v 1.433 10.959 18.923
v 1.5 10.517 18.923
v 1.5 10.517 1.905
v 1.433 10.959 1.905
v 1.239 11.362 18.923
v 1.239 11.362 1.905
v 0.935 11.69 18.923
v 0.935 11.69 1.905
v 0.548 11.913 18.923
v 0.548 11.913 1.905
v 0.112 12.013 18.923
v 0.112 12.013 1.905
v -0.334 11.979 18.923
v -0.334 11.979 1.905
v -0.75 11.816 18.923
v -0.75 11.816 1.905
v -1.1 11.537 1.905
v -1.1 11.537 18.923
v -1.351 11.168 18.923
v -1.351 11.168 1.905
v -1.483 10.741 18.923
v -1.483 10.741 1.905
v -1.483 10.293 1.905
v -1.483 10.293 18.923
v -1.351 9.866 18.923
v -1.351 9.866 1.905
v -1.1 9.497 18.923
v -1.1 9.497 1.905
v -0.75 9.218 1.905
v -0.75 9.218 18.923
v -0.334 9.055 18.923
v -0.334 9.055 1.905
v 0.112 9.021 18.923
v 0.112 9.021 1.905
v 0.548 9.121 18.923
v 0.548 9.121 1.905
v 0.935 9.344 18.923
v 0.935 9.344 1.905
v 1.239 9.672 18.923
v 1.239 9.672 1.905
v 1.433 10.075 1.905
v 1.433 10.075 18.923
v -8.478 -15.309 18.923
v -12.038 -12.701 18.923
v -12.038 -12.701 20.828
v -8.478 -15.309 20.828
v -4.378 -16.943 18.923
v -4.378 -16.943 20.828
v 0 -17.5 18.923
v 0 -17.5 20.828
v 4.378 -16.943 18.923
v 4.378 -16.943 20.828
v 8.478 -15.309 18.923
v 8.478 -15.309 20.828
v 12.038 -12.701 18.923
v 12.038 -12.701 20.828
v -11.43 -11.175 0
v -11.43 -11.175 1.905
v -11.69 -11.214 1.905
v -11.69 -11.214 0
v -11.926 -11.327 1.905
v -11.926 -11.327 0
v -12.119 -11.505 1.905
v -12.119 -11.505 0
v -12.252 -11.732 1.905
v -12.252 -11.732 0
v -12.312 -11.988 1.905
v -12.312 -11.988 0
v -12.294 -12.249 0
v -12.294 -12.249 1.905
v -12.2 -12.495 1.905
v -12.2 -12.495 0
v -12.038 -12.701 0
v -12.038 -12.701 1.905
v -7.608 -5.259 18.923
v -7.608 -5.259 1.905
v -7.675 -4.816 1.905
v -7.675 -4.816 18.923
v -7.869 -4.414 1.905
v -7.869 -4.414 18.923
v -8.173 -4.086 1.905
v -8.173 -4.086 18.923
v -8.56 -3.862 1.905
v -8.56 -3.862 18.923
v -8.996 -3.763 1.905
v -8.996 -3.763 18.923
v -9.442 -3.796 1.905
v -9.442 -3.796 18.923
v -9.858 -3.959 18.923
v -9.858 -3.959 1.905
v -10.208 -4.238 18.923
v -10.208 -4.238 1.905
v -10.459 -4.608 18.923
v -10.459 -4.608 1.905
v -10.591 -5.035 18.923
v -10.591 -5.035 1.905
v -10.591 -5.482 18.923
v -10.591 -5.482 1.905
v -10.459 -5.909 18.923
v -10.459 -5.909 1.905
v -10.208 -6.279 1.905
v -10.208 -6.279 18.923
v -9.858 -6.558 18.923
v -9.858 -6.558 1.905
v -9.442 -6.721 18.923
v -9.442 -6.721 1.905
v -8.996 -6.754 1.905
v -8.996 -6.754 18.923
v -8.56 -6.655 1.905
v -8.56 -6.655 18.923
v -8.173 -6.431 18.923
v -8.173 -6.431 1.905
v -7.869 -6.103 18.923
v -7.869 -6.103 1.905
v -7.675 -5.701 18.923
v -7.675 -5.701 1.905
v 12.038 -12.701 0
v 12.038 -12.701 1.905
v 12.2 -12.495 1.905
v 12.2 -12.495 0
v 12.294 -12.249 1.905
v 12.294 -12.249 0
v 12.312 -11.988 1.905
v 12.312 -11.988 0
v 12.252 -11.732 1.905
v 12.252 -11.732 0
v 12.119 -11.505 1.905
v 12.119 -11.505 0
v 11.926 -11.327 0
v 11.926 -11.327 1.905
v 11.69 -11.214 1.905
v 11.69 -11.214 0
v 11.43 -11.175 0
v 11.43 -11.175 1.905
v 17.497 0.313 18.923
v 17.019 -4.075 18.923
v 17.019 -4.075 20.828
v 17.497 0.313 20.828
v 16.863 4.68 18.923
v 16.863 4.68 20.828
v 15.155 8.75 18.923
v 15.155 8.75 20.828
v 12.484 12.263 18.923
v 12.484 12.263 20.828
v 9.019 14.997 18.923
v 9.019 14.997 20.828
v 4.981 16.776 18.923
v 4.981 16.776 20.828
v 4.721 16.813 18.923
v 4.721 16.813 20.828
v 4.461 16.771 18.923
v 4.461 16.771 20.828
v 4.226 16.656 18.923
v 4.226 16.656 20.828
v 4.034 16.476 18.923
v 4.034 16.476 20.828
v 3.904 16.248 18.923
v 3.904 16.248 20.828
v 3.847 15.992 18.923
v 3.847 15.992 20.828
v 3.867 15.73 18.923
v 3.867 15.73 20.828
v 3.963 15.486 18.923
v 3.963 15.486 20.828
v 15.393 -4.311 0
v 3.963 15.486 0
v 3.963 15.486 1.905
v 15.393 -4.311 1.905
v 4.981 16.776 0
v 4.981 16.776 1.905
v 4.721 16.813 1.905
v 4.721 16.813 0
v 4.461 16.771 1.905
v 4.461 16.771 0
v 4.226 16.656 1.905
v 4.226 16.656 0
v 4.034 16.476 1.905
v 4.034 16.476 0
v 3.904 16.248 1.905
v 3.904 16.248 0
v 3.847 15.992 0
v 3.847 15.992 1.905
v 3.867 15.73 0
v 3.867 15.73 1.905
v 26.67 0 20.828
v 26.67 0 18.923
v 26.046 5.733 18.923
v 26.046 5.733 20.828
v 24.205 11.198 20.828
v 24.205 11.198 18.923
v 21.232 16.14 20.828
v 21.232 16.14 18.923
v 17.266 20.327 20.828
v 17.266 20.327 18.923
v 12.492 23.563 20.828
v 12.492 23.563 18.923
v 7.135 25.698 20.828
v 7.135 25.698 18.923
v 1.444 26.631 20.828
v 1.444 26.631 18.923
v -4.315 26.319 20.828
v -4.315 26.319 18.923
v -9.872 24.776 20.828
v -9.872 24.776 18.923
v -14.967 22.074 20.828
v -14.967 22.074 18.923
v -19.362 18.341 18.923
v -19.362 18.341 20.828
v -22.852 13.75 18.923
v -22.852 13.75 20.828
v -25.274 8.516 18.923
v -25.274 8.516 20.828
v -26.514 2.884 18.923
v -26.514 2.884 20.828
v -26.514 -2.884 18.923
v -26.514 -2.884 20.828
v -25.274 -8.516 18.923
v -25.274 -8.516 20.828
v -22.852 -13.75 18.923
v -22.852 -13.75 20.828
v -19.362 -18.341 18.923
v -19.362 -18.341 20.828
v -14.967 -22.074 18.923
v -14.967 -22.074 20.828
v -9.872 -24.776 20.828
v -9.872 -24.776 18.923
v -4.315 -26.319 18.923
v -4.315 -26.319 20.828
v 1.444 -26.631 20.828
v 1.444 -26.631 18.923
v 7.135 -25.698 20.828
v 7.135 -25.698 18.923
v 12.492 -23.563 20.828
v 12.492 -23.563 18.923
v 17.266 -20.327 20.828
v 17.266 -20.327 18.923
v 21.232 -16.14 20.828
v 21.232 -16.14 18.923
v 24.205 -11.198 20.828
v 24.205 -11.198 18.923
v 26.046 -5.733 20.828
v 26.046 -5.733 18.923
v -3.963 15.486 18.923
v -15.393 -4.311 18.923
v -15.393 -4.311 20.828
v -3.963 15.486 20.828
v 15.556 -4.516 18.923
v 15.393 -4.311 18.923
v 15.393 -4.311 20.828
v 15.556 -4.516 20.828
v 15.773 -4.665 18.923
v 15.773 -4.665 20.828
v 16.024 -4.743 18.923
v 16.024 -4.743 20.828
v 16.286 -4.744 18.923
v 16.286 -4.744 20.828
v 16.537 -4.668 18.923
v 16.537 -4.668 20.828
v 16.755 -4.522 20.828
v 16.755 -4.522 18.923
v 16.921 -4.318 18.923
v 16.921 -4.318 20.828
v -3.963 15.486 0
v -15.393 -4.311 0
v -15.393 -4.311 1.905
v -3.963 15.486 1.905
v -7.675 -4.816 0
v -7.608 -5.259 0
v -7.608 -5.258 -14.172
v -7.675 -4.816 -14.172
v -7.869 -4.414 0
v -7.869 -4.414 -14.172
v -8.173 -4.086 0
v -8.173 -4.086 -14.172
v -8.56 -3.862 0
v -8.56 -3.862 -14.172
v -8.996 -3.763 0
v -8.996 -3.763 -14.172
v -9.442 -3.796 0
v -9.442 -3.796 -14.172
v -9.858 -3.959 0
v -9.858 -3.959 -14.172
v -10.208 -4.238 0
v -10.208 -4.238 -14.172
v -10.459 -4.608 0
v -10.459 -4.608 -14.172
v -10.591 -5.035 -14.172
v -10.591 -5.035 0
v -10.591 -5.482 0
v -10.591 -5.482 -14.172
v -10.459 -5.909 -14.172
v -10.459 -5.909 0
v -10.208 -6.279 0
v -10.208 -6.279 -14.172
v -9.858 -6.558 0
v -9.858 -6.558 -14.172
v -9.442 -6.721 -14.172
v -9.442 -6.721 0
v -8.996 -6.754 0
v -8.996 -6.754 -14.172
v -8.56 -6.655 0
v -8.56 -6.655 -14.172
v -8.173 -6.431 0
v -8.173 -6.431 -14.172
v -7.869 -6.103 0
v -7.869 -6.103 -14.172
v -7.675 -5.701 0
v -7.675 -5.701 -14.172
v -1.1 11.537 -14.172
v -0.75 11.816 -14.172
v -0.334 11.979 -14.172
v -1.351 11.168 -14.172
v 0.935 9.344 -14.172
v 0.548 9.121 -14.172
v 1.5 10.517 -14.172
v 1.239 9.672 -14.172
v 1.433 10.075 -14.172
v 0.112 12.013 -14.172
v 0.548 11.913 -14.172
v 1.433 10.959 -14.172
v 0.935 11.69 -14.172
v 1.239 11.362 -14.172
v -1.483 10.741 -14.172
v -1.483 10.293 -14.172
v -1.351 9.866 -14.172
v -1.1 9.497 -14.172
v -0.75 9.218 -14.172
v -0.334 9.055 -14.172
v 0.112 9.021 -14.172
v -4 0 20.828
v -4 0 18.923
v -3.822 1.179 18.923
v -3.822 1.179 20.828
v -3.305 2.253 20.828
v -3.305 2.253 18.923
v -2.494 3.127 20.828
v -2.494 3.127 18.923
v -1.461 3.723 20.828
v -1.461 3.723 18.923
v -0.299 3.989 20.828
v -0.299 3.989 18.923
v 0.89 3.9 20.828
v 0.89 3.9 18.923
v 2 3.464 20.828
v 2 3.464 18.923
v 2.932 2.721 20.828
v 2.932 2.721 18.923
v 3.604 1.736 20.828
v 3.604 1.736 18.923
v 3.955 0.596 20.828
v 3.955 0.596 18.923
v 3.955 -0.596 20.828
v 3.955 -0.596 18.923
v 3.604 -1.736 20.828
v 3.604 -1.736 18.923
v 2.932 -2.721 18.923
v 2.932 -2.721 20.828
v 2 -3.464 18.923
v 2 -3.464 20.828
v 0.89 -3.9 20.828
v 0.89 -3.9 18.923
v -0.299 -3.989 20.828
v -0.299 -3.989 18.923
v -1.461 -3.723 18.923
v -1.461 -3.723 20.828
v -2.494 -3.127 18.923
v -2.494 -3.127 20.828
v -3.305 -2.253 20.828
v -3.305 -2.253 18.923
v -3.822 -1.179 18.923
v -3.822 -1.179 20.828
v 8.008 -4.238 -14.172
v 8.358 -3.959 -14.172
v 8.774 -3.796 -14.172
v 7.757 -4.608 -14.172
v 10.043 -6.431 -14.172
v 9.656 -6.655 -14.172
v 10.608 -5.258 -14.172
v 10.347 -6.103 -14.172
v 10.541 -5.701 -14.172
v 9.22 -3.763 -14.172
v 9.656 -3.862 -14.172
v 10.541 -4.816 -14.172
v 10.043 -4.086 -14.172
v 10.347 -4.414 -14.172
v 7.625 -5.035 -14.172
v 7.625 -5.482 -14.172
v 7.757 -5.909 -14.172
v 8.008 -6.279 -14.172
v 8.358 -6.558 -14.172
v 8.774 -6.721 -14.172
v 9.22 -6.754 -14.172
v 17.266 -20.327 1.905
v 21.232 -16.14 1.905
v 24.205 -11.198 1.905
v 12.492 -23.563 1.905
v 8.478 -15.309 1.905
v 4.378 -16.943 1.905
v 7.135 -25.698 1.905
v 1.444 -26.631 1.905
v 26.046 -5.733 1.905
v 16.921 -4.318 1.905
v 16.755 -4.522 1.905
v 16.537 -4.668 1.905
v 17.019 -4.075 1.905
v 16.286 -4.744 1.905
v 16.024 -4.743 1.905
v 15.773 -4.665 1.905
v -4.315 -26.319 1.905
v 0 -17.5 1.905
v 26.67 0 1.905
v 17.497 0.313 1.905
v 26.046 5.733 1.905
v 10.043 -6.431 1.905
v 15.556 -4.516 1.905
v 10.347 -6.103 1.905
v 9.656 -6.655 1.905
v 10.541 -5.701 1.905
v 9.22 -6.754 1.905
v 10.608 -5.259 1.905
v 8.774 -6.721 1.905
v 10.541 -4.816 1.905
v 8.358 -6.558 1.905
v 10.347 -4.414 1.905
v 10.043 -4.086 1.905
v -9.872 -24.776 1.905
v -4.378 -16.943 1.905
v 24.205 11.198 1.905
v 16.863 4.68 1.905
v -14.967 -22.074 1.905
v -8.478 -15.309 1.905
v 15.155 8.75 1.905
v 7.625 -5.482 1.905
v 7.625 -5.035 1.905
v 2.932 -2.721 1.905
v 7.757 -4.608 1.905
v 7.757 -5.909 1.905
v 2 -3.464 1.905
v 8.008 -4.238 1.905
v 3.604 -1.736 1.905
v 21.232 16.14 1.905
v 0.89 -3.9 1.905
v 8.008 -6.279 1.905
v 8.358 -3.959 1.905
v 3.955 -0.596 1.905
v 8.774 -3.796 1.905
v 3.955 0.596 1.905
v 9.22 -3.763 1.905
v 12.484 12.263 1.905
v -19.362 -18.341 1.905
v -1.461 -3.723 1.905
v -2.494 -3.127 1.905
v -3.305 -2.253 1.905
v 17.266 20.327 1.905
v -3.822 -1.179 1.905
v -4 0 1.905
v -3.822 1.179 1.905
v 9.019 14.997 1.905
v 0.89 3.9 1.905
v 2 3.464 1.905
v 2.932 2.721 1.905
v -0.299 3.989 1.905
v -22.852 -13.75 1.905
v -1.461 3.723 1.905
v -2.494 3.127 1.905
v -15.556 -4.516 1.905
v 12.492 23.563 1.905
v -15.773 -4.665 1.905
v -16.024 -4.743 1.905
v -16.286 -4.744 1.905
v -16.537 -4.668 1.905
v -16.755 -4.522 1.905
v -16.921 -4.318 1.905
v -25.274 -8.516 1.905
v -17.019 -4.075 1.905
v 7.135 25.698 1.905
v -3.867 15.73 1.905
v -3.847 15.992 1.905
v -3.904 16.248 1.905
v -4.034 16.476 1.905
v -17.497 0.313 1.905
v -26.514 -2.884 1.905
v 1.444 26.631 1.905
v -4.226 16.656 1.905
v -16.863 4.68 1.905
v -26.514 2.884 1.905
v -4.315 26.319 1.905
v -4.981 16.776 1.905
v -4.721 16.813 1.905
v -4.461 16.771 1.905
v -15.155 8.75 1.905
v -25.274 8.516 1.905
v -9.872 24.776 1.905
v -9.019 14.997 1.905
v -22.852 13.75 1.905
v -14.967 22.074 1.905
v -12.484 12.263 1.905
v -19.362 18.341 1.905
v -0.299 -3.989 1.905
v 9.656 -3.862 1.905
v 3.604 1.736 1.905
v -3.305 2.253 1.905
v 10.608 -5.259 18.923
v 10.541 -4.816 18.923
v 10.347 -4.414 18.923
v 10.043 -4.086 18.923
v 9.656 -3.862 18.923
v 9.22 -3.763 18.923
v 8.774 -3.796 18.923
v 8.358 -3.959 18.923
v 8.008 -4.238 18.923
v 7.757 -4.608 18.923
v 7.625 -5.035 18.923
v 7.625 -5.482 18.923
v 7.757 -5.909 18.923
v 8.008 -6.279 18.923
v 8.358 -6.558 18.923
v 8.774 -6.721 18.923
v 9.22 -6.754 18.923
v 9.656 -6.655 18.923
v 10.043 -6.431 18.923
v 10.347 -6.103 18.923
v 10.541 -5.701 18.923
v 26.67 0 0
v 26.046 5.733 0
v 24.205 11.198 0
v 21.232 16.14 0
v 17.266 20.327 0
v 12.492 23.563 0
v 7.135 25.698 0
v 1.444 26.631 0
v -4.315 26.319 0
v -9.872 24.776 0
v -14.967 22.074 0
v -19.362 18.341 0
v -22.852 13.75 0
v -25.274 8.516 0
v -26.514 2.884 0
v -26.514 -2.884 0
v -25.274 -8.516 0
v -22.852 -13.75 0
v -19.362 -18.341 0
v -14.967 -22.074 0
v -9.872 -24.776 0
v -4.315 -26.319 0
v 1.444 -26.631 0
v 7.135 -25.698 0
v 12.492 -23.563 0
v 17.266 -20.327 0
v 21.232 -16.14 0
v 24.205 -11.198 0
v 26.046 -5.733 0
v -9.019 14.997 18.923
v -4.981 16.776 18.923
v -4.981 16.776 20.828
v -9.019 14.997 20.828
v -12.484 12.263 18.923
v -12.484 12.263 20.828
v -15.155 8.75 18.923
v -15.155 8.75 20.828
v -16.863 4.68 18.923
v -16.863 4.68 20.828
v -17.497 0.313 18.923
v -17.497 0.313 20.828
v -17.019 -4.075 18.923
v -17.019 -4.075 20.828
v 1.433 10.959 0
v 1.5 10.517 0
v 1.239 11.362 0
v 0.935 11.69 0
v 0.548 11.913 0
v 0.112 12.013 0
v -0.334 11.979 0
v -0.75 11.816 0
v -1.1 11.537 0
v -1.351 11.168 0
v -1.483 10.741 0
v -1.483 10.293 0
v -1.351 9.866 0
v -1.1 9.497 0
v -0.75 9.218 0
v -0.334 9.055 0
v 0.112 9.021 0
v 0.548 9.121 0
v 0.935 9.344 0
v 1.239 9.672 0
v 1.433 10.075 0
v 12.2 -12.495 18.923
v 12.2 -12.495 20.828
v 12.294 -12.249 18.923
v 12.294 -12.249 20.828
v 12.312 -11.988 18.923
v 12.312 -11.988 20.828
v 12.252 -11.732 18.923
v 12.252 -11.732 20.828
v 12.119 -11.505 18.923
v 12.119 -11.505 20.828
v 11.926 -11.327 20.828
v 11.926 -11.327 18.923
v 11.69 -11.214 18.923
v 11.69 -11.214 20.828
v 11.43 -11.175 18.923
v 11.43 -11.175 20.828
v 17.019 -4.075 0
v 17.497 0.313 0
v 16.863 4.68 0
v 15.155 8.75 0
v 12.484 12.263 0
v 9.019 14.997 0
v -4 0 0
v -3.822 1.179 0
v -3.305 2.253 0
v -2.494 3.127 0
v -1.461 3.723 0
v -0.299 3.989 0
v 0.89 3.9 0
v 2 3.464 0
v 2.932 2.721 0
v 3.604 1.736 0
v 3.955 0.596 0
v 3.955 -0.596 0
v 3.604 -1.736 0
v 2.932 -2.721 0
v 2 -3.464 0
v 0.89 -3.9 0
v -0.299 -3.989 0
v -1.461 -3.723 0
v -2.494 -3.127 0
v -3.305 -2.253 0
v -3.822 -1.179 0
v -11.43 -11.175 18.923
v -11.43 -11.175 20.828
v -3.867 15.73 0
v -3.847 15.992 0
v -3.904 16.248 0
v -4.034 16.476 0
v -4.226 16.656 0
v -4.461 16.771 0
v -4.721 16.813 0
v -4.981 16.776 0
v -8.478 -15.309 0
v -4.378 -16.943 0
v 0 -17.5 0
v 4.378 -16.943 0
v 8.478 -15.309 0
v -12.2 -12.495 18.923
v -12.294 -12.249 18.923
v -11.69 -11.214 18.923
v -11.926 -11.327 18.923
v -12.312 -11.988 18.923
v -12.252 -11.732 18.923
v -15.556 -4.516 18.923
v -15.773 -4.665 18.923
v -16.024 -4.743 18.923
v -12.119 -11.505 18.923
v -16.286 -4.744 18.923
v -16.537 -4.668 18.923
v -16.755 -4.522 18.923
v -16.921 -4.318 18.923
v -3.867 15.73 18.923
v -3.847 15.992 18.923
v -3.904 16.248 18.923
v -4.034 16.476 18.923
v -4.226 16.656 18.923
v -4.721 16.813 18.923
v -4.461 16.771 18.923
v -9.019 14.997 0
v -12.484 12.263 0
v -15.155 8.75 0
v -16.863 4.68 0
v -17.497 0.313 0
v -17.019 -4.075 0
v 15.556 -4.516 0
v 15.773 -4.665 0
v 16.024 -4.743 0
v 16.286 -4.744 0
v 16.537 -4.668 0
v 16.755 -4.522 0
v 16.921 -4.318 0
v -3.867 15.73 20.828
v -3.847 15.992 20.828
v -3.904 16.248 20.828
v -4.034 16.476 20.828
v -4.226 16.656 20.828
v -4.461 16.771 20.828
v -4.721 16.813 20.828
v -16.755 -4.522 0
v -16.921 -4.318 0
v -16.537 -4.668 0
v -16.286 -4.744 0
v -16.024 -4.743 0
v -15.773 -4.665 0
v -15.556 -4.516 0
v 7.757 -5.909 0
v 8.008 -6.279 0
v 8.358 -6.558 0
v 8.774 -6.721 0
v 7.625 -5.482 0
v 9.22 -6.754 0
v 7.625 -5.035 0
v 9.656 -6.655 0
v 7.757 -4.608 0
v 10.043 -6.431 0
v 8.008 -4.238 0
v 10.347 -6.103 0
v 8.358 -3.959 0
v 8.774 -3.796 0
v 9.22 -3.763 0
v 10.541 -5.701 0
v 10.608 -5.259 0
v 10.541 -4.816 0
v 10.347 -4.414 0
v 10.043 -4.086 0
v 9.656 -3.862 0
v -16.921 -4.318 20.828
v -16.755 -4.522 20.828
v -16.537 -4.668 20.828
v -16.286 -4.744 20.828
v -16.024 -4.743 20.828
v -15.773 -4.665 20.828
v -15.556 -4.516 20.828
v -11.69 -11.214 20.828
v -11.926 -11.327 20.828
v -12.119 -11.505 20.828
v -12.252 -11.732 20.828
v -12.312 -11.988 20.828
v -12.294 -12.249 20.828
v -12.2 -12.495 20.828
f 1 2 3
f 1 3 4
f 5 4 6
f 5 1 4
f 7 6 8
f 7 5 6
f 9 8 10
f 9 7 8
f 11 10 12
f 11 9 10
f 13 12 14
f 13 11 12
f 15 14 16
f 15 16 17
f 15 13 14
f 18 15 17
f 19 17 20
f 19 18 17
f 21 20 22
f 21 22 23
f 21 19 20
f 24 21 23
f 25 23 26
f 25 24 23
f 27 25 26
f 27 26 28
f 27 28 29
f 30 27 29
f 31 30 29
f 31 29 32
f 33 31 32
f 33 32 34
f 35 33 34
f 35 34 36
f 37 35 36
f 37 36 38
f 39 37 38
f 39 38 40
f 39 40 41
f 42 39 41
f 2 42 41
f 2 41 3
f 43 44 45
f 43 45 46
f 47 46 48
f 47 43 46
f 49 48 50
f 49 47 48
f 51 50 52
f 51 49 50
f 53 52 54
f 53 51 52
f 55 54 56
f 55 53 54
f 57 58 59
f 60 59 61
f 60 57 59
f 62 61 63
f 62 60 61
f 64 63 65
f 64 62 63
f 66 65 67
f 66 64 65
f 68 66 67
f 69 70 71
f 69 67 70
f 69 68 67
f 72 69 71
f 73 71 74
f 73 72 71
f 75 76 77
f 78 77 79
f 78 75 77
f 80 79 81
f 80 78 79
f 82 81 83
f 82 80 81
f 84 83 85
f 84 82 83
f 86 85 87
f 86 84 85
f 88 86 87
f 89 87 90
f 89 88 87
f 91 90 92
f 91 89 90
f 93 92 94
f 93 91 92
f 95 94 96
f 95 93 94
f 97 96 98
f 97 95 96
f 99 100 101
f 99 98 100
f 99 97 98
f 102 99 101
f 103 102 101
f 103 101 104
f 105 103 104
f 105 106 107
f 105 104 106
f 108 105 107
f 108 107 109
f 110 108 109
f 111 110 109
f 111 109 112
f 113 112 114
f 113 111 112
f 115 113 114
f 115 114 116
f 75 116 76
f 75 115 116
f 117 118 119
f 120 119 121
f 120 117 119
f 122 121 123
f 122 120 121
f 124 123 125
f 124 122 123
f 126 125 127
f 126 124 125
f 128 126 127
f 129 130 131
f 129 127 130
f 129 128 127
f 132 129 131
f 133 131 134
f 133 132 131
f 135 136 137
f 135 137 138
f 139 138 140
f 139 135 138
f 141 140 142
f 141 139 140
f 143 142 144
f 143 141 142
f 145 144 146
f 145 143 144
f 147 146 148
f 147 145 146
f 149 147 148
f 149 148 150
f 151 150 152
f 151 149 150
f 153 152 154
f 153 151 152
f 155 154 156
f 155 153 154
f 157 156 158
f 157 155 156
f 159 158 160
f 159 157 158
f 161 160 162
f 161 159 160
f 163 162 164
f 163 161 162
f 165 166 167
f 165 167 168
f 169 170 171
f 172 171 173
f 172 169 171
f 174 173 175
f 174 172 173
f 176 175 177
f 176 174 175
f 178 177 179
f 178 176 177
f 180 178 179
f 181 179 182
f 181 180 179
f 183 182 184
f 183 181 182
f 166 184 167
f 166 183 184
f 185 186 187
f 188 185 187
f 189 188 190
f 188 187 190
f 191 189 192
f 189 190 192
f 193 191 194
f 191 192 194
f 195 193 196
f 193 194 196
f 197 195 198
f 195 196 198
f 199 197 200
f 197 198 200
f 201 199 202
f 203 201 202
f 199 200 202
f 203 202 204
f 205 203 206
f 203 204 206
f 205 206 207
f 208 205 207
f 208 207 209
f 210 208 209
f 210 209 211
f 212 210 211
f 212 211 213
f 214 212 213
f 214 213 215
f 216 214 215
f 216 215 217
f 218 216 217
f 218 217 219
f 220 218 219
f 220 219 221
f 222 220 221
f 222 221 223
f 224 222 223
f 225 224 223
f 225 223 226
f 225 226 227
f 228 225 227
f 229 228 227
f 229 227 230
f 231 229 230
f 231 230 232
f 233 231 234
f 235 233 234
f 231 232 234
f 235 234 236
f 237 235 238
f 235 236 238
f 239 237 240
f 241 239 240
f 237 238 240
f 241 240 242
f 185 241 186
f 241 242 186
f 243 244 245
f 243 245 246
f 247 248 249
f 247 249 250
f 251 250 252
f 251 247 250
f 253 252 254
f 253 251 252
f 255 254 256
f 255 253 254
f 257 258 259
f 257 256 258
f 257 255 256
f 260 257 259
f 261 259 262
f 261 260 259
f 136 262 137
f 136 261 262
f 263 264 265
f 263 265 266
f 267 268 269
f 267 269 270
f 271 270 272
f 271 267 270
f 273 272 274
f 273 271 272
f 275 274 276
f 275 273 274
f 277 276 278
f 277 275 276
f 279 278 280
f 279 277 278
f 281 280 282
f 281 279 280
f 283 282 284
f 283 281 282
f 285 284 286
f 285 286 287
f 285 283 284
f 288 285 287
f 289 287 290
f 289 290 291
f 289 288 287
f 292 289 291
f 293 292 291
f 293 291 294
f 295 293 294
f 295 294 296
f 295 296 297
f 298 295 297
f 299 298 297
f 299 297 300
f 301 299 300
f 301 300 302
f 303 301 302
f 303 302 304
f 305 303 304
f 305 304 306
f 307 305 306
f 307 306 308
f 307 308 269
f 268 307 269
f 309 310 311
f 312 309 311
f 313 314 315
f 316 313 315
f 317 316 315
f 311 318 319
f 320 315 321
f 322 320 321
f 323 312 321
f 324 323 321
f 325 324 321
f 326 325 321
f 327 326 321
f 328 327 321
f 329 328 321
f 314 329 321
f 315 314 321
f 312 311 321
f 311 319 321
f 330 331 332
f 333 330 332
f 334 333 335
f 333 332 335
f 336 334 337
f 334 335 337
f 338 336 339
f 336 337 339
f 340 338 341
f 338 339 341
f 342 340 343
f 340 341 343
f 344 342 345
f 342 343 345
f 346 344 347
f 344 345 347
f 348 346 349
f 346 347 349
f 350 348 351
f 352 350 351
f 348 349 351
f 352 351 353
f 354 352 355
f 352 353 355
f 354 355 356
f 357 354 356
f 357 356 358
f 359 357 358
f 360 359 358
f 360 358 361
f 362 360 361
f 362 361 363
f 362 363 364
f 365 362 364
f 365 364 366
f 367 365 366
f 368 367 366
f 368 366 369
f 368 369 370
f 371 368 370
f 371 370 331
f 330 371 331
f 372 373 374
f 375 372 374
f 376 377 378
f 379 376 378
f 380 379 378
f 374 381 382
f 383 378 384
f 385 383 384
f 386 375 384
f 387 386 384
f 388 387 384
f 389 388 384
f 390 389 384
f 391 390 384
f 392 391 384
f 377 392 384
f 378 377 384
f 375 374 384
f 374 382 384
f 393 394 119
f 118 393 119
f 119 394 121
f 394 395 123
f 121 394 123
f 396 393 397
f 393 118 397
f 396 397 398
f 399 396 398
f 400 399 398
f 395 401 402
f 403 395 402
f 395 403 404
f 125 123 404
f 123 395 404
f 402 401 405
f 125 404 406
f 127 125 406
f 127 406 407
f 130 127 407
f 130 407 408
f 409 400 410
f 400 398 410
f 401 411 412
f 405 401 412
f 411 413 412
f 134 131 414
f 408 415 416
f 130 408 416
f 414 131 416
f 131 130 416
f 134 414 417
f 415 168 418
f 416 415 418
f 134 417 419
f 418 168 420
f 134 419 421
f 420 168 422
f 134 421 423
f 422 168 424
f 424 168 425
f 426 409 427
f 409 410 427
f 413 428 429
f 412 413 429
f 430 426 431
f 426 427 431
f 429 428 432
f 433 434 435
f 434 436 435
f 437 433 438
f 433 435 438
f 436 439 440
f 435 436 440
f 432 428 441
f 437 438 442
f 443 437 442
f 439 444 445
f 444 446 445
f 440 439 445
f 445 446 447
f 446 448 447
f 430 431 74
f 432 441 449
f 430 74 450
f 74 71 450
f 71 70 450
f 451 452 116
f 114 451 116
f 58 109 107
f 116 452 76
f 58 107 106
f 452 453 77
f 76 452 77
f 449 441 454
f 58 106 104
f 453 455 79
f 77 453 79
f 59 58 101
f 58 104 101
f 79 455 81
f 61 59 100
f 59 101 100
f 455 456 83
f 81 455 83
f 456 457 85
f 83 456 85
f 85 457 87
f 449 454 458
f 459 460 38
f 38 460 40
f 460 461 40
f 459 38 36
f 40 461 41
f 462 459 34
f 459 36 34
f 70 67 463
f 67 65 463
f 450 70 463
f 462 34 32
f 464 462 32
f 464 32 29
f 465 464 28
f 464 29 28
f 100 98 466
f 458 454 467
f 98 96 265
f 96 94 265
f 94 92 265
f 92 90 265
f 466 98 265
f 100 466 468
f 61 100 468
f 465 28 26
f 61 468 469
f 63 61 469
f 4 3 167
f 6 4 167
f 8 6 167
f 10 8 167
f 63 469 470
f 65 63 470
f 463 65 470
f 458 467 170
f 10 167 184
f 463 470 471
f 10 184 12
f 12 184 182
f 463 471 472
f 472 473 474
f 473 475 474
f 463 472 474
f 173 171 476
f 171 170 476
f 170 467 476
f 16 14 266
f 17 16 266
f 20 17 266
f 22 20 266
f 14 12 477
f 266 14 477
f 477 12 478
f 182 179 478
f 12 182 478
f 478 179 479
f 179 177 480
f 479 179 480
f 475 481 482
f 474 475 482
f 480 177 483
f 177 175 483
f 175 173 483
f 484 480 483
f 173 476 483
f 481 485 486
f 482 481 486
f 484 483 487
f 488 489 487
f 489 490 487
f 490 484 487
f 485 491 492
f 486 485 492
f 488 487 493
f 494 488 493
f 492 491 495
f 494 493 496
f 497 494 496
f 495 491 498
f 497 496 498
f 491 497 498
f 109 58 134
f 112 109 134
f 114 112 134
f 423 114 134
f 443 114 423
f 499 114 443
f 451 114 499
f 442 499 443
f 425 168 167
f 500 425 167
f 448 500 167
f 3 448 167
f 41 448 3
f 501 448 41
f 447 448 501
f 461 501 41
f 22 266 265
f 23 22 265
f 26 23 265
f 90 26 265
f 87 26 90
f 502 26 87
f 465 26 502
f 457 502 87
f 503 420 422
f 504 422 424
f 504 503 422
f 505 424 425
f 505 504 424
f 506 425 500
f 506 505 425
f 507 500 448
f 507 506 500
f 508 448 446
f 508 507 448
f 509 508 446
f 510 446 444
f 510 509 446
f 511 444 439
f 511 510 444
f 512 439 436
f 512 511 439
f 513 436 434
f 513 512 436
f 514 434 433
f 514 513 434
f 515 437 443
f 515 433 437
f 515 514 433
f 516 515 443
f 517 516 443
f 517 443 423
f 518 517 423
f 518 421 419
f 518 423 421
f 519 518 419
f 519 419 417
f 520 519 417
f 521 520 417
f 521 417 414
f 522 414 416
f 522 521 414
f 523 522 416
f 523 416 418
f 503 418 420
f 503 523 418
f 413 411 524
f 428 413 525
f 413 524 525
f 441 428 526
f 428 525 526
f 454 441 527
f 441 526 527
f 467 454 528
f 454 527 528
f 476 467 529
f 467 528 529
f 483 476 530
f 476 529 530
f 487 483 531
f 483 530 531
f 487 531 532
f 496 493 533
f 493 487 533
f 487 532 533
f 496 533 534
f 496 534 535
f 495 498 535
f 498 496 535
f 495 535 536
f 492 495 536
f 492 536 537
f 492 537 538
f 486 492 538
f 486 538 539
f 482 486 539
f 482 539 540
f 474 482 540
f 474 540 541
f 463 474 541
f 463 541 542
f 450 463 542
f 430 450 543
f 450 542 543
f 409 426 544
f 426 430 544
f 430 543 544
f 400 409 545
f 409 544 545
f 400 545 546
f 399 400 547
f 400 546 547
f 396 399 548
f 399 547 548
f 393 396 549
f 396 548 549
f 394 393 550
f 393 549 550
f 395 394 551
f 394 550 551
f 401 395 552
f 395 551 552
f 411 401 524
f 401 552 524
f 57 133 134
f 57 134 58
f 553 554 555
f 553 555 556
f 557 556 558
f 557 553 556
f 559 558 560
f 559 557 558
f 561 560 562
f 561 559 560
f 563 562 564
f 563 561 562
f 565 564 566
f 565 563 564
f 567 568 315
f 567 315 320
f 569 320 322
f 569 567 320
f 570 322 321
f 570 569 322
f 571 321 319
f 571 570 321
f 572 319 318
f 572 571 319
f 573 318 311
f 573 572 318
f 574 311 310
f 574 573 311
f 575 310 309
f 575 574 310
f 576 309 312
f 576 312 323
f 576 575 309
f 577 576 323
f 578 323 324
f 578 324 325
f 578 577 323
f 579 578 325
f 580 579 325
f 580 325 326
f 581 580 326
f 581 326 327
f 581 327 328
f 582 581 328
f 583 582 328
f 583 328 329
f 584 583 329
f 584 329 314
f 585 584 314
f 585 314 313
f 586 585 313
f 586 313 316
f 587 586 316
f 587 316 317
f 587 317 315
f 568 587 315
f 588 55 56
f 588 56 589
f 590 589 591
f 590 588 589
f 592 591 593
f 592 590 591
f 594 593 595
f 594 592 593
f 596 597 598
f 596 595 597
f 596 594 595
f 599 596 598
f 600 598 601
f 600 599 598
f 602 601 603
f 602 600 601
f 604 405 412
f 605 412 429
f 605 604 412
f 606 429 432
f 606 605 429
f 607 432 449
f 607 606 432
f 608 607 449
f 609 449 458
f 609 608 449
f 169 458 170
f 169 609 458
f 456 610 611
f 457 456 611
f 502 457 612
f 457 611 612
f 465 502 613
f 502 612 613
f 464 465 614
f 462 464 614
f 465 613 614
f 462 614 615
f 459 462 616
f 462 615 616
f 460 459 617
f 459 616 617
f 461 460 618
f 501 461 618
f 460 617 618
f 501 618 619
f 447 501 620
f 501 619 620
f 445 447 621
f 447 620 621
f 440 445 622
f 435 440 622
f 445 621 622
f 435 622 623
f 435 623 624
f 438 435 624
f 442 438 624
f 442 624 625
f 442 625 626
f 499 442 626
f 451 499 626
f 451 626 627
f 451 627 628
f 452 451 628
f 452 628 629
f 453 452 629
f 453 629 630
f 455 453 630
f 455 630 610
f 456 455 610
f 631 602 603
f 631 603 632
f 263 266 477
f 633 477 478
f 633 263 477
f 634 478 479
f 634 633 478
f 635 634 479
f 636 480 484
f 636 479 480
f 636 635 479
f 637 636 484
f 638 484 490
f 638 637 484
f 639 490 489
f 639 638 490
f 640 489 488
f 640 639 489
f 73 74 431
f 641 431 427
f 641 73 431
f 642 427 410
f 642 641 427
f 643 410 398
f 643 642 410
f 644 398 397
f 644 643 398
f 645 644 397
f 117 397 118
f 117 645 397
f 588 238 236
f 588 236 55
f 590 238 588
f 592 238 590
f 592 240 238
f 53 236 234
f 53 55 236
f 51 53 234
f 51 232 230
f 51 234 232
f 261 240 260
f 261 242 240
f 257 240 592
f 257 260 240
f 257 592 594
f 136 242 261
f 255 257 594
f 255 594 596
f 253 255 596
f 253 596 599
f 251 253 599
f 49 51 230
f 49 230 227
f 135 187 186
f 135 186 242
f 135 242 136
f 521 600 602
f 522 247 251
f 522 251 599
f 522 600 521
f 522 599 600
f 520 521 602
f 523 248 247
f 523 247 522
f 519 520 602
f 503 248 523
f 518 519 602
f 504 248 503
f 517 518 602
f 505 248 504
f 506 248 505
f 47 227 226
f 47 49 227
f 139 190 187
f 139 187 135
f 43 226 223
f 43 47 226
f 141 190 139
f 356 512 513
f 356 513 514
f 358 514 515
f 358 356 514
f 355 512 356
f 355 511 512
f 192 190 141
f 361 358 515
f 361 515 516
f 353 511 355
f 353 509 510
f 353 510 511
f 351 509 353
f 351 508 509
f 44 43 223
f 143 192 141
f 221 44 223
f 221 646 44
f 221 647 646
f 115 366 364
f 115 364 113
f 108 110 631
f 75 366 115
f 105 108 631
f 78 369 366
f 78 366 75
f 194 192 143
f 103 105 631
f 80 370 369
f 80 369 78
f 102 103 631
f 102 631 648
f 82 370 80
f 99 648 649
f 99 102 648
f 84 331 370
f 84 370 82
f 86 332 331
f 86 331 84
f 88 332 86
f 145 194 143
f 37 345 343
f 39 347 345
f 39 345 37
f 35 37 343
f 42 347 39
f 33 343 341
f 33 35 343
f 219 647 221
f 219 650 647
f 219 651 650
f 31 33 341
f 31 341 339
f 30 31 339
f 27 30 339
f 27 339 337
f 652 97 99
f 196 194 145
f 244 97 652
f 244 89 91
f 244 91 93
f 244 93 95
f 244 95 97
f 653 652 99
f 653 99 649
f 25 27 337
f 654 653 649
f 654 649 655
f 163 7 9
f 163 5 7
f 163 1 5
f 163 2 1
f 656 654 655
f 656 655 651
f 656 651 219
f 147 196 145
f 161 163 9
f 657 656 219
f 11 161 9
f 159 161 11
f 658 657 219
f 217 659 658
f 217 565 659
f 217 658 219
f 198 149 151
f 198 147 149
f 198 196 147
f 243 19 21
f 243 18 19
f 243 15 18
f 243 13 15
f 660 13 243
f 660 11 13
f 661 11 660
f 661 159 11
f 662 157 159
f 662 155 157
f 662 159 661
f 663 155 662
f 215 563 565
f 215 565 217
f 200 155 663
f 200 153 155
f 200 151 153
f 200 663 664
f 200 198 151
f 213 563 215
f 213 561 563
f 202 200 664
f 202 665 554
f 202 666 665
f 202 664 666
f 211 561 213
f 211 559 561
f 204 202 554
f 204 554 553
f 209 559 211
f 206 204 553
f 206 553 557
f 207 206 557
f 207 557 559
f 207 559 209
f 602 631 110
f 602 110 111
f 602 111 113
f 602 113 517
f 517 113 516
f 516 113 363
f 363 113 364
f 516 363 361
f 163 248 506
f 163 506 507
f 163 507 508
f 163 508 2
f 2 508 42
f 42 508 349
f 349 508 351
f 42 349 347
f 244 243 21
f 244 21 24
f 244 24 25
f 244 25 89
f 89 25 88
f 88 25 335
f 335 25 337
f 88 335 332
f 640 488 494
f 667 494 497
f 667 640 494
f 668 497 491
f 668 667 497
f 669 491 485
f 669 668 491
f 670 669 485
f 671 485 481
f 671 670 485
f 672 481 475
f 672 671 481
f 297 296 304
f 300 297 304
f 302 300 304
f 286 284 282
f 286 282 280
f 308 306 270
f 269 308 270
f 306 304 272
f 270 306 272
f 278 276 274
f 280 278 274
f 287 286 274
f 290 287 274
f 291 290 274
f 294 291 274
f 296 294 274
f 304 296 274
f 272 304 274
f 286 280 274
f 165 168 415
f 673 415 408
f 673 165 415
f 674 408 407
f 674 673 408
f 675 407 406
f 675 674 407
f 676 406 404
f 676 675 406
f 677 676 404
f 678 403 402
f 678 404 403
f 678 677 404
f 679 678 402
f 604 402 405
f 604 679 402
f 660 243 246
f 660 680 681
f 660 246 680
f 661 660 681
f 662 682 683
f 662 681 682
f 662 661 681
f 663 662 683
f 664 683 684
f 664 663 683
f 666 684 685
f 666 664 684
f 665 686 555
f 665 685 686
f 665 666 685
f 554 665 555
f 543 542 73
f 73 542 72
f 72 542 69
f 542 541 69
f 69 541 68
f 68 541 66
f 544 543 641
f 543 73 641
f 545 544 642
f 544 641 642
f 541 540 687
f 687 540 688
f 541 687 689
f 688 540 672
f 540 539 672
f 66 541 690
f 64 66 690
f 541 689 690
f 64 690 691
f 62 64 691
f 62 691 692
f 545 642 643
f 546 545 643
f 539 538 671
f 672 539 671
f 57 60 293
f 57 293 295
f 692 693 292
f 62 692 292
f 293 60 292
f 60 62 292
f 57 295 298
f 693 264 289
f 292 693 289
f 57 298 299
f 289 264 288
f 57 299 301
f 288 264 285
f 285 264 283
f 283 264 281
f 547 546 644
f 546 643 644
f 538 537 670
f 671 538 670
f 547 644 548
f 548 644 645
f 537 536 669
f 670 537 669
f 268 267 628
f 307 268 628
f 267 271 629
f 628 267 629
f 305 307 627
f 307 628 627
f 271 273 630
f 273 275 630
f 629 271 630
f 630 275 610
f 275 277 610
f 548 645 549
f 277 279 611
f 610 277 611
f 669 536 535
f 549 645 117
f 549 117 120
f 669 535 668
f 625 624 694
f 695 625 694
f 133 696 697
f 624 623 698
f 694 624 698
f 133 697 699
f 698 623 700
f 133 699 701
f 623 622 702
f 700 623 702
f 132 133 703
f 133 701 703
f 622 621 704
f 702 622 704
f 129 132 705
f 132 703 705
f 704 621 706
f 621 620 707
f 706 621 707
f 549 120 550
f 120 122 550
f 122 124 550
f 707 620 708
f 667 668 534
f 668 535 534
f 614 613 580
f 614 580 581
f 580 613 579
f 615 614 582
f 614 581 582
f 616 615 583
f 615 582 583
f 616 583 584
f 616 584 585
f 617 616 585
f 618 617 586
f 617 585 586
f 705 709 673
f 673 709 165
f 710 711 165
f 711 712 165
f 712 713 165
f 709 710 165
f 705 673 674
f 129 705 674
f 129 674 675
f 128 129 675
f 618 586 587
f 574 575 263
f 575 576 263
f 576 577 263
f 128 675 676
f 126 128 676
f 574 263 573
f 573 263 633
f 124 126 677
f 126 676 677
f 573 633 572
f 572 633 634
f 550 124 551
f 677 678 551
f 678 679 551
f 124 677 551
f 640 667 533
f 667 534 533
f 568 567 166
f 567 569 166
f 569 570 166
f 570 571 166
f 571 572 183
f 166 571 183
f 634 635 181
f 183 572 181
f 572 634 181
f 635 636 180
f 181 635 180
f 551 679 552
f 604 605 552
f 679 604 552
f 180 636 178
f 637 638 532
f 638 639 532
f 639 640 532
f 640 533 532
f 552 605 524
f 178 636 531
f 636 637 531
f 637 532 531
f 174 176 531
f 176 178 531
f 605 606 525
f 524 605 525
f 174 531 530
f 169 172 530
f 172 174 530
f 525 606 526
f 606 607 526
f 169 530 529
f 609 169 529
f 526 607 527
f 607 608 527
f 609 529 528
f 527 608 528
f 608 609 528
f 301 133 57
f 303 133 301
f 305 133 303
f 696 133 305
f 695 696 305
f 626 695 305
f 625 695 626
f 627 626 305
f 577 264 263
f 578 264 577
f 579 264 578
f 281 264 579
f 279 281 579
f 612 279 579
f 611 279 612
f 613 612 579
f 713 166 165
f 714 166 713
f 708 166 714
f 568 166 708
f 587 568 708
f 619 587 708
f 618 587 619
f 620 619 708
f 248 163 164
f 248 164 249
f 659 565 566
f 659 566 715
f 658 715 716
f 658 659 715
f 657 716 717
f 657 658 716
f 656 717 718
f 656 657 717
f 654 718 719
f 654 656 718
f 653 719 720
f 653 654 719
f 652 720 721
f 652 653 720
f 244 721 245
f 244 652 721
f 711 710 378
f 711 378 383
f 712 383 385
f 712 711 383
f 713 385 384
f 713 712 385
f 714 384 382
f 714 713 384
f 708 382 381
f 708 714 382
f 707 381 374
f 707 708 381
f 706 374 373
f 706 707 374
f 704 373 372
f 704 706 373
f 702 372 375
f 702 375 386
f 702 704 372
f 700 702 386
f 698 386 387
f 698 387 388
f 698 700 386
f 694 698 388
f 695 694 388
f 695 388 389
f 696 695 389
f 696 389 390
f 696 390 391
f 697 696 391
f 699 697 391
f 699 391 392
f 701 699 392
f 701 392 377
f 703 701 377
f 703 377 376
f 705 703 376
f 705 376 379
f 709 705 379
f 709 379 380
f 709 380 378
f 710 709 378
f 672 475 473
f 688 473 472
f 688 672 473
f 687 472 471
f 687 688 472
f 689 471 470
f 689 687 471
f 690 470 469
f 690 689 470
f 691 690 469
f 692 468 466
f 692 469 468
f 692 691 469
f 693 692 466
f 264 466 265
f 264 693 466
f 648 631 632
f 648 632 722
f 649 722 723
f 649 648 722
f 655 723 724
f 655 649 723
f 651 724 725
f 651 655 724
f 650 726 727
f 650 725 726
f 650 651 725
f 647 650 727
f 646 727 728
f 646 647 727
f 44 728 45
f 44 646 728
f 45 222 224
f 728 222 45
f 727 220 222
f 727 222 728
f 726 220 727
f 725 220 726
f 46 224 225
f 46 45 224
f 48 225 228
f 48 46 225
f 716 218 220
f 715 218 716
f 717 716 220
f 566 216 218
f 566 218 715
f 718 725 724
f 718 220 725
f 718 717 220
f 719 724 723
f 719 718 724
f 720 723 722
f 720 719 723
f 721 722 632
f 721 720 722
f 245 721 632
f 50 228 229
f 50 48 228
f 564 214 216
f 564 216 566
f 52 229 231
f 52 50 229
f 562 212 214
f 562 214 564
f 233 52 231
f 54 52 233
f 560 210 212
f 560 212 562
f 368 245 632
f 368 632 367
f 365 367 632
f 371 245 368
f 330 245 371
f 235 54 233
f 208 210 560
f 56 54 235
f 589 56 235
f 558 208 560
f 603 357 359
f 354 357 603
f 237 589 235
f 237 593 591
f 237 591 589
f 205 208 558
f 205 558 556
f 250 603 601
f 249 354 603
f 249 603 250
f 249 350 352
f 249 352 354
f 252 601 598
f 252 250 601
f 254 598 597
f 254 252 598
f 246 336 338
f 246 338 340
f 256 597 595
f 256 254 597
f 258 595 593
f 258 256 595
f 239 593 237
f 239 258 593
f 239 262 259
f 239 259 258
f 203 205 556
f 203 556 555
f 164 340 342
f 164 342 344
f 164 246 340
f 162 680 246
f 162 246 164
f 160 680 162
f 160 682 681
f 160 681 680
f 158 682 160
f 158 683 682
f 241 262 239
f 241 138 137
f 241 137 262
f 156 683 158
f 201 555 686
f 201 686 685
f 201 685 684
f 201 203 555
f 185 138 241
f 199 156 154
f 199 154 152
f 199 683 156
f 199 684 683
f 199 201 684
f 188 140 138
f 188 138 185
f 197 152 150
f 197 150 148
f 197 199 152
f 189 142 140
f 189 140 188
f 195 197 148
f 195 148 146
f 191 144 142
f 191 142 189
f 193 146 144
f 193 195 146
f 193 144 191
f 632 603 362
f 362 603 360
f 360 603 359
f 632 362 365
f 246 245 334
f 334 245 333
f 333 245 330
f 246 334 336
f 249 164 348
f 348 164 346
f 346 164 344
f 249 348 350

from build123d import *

# Parameters (mm, degrees)
SKETCH1_R           = 26.67
BOSS_EXTRUDE1_DEPTH = 20.828
SKETCH4_R           = 1.5
SKETCH4_R_2         = 4
CUT_EXTRUDE2_DEPTH  = 21.828
CUT_EXTRUDE3_START  = -10.414
SKETCH5_R           = 26.67
CUT_EXTRUDE3_DEPTH  = 8.509
BOSS_EXTRUDE2_START = 10.414
SKETCH9_R           = 1.5
BOSS_EXTRUDE2_DEPTH = 35


with BuildPart() as part:
    # Sketch1 → Boss-Extrude1 (new body)
    with BuildSketch(Plane.XY):
        Circle(SKETCH1_R)
    extrude(amount=BOSS_EXTRUDE1_DEPTH)

    # Sketch4 → Cut-Extrude2 (cut, through all)
    with BuildSketch(Plane(origin=(0, 0, 0), x_dir=(-1, 0, 0), z_dir=(0, 0, -1))):
        with Locations((0, 10.517)):
            Circle(SKETCH4_R)
        with Locations((9.107989172, -5.2585)):
            Circle(SKETCH4_R)
        with Locations((-9.107989172, -5.2585)):
            Circle(SKETCH4_R)
        Circle(SKETCH4_R_2)
        with BuildLine():
            Line((-3.962833887, 15.486170365), (-15.392833887, -4.311170365))
            ThreePointArc((-15.392833887, -4.311170365), (-16.285992128, -4.744214498), (-17.018969403, -4.074884104))
            ThreePointArc((-17.018969403, -4.074884104), (-15.155444566, 8.75), (-4.98053155, 16.776301901))
            ThreePointArc((-4.98053155, 16.776301901), (-4.034385787, 16.476190157), (-3.962833887, 15.486170365))
        make_face()
        with BuildLine():
            Line((15.392833887, -4.311170365), (3.962833887, 15.486170365))
            ThreePointArc((3.962833887, 15.486170365), (4.034385787, 16.476190157), (4.98053155, 16.776301901))
            ThreePointArc((4.98053155, 16.776301901), (15.155444566, 8.75), (17.018969403, -4.074884104))
            ThreePointArc((17.018969403, -4.074884104), (16.285992128, -4.744214498), (15.392833887, -4.311170365))
        make_face()
        with BuildLine():
            Line((-11.43, -11.175), (11.43, -11.175))
            ThreePointArc((11.43, -11.175), (12.25160634, -11.731975659), (12.038437853, -12.701417798))
            ThreePointArc((12.038437853, -12.701417798), (0, -17.5), (-12.038437853, -12.701417798))
            ThreePointArc((-12.038437853, -12.701417798), (-12.25160634, -11.731975659), (-11.43, -11.175))
        make_face()
    extrude(amount=-CUT_EXTRUDE2_DEPTH, mode=Mode.SUBTRACT)

    # Sketch5 → Cut-Extrude3 (cut, symmetric)
    with BuildSketch(Plane(origin=(0, 0, 0), x_dir=(-1, 0, 0), z_dir=(0, 0, -1)).offset(CUT_EXTRUDE3_START)):
        Circle(SKETCH5_R)
    extrude(amount=CUT_EXTRUDE3_DEPTH, both=True, mode=Mode.SUBTRACT)

    # Sketch9 → Boss-Extrude2 (add)
    with BuildSketch(Plane.XY.offset(10.414).offset(BOSS_EXTRUDE2_START)):
        with Locations((0, 10.517)):
            Circle(SKETCH9_R)
        with Locations((9.107989172, -5.2585)):
            Circle(SKETCH9_R)
        with Locations((-9.107989172, -5.2585)):
            Circle(SKETCH9_R)
    extrude(amount=-BOSS_EXTRUDE2_DEPTH)


solid = part.part
